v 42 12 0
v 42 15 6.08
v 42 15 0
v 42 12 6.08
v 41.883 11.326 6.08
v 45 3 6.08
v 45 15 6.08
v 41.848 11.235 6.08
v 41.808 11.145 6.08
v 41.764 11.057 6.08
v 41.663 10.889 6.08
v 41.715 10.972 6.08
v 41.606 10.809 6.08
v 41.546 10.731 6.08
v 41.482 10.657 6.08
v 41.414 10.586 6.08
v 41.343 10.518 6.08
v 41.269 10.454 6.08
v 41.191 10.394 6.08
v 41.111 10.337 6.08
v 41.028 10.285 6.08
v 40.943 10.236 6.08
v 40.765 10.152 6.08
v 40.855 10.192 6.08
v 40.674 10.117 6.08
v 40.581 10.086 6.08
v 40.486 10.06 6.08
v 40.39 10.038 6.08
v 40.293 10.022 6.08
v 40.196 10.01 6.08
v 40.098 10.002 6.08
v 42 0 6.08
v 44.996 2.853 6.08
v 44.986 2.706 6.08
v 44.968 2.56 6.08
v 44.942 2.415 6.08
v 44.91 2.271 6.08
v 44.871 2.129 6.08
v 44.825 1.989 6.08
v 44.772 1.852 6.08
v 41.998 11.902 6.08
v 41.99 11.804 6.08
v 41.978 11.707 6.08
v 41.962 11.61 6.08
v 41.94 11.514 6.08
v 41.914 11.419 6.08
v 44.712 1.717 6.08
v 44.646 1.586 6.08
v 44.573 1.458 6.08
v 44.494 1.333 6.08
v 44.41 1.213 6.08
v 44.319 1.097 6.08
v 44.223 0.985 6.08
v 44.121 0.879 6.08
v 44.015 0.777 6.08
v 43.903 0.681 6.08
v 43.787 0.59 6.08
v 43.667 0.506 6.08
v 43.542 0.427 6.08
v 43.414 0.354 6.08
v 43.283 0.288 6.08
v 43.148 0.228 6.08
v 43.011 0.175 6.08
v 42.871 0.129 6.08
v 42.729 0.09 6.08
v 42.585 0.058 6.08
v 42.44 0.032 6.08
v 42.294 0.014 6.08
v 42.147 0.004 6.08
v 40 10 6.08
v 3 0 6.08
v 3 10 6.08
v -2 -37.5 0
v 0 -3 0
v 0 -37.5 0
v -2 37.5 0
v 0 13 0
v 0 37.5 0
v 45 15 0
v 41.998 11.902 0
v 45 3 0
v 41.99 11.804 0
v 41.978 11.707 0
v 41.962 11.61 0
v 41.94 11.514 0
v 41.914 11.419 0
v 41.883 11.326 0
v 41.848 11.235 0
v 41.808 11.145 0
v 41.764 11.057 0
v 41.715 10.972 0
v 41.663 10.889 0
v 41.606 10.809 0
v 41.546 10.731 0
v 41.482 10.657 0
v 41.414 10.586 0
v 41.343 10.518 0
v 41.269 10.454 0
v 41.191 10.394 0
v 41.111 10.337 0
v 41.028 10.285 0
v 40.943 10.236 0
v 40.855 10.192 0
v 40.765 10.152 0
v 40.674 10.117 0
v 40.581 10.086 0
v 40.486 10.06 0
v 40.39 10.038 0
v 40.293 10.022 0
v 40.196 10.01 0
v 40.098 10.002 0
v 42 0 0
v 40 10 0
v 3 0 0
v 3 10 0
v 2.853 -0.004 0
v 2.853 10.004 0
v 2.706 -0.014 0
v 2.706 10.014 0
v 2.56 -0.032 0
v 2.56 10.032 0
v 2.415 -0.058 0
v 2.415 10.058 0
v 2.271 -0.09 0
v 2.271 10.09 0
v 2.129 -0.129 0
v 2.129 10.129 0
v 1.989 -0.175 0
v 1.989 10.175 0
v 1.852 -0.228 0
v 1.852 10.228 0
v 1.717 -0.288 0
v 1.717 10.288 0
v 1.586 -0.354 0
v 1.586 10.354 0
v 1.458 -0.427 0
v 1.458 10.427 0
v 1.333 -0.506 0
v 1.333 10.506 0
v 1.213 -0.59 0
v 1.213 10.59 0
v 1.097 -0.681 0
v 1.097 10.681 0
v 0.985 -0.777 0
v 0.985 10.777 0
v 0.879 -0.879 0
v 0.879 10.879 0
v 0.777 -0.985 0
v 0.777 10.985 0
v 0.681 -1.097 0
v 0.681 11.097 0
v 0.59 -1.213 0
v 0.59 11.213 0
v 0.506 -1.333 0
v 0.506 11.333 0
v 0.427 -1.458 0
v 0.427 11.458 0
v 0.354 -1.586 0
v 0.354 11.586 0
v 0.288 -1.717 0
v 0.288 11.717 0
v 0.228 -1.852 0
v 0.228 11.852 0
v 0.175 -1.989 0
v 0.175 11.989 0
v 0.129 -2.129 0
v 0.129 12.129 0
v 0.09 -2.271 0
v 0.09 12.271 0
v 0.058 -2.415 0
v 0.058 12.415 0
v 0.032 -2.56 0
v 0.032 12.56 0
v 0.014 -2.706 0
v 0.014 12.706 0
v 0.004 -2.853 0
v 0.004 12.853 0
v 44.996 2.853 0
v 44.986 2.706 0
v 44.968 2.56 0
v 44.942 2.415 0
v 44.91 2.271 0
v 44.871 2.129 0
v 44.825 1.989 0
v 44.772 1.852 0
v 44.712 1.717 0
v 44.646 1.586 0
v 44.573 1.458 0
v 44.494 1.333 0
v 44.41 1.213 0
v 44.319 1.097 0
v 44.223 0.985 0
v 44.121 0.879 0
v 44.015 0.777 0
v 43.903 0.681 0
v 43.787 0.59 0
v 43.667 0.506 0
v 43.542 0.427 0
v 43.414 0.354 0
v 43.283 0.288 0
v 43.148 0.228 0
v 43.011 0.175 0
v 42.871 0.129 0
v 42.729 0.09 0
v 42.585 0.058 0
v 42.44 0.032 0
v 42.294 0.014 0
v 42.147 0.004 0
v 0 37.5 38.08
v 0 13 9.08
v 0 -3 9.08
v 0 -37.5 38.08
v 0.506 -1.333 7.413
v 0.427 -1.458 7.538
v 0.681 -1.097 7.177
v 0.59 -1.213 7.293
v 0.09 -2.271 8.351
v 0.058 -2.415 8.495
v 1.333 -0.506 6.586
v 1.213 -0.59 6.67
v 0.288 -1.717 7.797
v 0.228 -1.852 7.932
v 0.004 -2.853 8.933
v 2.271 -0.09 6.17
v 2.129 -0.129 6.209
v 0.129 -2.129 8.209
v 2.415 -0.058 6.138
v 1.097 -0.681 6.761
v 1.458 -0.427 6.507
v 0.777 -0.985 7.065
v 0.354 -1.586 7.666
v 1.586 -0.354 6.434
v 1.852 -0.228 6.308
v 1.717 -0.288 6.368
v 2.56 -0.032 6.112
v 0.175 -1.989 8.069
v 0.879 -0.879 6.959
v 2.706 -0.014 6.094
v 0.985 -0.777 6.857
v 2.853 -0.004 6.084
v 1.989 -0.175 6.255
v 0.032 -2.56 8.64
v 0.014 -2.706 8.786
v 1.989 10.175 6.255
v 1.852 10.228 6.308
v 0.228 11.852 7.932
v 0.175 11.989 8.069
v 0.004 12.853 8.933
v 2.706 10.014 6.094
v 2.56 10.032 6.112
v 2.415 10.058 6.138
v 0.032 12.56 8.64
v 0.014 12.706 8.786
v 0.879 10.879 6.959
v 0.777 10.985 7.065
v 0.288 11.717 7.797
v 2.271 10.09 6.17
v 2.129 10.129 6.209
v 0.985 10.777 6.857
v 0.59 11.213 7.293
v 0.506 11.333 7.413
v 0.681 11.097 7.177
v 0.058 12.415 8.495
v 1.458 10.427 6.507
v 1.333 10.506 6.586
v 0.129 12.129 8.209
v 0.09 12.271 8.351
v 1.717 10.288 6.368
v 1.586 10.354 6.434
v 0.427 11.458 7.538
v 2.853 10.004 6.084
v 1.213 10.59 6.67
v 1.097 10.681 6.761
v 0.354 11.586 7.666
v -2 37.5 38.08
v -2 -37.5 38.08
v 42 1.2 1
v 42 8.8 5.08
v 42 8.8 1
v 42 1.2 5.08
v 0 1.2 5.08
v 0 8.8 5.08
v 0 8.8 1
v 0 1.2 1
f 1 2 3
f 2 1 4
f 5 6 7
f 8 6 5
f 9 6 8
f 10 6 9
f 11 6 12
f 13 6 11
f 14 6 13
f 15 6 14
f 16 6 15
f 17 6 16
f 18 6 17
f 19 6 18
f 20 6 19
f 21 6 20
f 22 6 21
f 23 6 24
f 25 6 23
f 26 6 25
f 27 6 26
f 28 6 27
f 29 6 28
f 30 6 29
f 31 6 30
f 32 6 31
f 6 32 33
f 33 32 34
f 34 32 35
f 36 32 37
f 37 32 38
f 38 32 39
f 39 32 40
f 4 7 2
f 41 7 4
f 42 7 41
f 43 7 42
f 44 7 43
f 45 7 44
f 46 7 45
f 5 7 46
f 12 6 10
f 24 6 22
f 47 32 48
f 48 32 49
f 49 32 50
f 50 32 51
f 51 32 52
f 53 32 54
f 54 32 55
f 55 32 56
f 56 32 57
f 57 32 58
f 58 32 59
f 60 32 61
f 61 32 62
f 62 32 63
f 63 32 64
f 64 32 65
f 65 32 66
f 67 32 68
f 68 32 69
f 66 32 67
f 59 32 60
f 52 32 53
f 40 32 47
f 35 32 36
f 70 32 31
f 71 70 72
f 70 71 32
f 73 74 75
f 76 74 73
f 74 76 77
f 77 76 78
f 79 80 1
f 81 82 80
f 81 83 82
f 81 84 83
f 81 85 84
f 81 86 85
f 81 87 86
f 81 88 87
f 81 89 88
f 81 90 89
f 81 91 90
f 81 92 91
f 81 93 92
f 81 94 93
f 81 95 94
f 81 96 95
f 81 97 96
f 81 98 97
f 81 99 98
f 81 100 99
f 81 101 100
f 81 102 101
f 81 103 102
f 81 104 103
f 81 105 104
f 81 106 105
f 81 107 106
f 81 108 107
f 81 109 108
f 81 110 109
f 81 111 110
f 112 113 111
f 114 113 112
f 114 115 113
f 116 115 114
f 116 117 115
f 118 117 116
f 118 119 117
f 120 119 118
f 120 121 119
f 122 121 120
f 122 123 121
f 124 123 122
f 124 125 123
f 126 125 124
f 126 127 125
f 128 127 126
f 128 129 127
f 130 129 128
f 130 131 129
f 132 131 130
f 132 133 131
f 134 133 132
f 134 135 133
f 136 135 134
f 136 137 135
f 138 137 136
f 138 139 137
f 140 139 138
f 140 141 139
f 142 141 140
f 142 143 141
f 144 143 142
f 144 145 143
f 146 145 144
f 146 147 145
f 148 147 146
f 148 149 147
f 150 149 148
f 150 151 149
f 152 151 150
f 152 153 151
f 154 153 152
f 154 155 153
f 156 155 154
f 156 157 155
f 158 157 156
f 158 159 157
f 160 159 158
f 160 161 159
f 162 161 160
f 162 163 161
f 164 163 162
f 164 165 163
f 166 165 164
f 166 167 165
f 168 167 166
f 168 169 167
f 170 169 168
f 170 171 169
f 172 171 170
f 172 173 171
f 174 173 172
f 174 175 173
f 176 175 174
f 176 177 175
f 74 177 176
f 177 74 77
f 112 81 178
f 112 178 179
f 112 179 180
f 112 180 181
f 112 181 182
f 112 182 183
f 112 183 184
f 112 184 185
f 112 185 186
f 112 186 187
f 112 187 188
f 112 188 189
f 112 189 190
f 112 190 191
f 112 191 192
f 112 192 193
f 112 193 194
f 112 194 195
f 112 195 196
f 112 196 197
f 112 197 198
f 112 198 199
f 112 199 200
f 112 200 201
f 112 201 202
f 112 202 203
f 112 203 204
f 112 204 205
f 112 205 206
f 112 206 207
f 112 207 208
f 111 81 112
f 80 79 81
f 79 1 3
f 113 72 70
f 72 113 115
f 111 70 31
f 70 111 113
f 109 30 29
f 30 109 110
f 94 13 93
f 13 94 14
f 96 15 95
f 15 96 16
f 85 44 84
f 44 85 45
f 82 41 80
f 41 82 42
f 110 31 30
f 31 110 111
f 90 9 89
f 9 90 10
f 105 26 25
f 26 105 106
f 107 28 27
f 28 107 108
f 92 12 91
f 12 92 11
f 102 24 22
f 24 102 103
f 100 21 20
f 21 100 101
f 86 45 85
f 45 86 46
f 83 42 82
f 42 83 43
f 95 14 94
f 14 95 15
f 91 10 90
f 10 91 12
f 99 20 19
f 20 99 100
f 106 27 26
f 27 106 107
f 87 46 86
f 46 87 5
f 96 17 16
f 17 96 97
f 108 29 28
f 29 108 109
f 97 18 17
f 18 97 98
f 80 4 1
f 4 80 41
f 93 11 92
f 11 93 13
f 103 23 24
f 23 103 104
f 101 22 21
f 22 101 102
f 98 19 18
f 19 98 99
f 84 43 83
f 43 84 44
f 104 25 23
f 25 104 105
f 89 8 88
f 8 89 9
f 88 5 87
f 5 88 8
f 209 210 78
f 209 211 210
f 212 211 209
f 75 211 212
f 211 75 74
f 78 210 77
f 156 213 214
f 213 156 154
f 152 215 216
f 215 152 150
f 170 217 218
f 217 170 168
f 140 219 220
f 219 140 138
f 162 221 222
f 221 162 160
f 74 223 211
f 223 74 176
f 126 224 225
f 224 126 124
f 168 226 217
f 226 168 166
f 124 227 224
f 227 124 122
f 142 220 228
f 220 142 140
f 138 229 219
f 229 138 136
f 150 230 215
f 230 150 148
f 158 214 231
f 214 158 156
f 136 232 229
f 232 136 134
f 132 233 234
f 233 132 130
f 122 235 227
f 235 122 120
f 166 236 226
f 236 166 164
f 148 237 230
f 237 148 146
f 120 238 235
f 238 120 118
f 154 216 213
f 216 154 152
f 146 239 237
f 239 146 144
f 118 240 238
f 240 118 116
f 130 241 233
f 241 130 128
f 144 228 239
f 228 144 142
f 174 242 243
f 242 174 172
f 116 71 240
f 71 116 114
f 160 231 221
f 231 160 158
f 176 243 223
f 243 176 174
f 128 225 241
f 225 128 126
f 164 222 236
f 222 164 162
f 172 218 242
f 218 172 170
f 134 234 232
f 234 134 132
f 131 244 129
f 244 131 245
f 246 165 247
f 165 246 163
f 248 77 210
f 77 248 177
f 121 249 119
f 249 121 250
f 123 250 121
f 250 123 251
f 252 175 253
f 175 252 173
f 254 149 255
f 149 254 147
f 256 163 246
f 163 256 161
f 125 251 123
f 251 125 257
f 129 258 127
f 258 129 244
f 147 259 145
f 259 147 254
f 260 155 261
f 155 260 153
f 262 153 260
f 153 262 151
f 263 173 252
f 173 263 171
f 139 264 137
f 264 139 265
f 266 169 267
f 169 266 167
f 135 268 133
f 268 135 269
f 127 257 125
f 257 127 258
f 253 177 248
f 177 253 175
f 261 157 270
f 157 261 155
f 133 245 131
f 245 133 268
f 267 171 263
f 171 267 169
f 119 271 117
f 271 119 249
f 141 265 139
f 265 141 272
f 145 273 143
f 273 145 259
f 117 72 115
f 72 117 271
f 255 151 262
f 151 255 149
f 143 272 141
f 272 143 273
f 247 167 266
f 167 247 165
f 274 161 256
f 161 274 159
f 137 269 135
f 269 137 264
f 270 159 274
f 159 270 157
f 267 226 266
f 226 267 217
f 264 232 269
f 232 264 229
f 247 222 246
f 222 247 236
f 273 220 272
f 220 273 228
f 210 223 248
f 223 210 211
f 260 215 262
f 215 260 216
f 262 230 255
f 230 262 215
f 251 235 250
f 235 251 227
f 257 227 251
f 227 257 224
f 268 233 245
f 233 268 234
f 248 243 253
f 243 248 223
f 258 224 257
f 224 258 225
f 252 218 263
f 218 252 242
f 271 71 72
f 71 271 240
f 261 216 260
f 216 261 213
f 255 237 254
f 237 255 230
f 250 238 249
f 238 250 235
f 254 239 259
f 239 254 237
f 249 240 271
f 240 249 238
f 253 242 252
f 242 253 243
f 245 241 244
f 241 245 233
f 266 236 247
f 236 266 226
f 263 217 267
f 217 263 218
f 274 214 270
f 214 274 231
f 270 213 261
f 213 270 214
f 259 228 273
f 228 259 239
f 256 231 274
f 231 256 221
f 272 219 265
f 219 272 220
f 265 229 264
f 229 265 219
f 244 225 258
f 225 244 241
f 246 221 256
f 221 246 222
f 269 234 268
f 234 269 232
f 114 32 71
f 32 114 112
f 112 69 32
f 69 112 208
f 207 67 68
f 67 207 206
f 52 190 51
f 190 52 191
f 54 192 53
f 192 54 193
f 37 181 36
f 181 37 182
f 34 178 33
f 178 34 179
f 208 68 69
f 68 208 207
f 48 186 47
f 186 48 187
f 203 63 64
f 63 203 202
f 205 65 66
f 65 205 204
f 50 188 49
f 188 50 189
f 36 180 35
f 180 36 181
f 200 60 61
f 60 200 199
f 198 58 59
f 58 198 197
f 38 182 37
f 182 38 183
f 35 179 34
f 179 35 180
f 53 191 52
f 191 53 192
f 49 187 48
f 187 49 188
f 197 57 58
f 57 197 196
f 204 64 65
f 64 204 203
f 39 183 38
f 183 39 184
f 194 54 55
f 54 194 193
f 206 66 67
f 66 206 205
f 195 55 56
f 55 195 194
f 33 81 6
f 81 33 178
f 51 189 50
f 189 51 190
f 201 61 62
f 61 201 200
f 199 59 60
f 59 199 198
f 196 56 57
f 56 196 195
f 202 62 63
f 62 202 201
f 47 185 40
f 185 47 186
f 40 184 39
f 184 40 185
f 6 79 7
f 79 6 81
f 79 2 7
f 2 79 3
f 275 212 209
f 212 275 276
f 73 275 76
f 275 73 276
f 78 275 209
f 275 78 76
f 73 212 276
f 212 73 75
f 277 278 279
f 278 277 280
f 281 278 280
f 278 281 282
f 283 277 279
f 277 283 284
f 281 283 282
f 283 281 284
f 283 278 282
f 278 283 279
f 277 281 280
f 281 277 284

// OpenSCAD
lw=0.4;
lh=0.32;

$fn=128;

th=fh(6);
w=fw(2);

difference() {
union() {
  // tongue
  cube([42,fw(10),th]);
  // end
  translate([42,3]) cylinder(h=th,r=3);
  translate([42,3]) cube([3,5+10-3,th]);
  // end internal fillet
  difference() {
    translate([42-2,10]) cube([2,2,th]);
    translate([42-2,10+2,-1]) cylinder(h=100,r=2);
  }
  // base
  translate([-fw(2),-75/2]) cube([fw(2),75,fh(19*2)]);
  // base fillet
  difference() {
    translate([0,-3]) cube([3,10+2*3,th+3]);
    translate([3,-3]) cylinder(h=100,r=3,center=true);
    translate([3,10+3]) cylinder(h=100,r=3,center=true);
    rotate([-90,0,0]) translate([3,-3-th]) cylinder(h=100,r=3,center=true);
  }
}
translate([0,1.2,1]) cube([42,fw(10)-2*1.2,th-2*1]);
}

module section() {
}

function f(x,target)=ceil(x/target)*target;
function fw(x)=f(x,lw);
function fh(x)=f(x,lh);
